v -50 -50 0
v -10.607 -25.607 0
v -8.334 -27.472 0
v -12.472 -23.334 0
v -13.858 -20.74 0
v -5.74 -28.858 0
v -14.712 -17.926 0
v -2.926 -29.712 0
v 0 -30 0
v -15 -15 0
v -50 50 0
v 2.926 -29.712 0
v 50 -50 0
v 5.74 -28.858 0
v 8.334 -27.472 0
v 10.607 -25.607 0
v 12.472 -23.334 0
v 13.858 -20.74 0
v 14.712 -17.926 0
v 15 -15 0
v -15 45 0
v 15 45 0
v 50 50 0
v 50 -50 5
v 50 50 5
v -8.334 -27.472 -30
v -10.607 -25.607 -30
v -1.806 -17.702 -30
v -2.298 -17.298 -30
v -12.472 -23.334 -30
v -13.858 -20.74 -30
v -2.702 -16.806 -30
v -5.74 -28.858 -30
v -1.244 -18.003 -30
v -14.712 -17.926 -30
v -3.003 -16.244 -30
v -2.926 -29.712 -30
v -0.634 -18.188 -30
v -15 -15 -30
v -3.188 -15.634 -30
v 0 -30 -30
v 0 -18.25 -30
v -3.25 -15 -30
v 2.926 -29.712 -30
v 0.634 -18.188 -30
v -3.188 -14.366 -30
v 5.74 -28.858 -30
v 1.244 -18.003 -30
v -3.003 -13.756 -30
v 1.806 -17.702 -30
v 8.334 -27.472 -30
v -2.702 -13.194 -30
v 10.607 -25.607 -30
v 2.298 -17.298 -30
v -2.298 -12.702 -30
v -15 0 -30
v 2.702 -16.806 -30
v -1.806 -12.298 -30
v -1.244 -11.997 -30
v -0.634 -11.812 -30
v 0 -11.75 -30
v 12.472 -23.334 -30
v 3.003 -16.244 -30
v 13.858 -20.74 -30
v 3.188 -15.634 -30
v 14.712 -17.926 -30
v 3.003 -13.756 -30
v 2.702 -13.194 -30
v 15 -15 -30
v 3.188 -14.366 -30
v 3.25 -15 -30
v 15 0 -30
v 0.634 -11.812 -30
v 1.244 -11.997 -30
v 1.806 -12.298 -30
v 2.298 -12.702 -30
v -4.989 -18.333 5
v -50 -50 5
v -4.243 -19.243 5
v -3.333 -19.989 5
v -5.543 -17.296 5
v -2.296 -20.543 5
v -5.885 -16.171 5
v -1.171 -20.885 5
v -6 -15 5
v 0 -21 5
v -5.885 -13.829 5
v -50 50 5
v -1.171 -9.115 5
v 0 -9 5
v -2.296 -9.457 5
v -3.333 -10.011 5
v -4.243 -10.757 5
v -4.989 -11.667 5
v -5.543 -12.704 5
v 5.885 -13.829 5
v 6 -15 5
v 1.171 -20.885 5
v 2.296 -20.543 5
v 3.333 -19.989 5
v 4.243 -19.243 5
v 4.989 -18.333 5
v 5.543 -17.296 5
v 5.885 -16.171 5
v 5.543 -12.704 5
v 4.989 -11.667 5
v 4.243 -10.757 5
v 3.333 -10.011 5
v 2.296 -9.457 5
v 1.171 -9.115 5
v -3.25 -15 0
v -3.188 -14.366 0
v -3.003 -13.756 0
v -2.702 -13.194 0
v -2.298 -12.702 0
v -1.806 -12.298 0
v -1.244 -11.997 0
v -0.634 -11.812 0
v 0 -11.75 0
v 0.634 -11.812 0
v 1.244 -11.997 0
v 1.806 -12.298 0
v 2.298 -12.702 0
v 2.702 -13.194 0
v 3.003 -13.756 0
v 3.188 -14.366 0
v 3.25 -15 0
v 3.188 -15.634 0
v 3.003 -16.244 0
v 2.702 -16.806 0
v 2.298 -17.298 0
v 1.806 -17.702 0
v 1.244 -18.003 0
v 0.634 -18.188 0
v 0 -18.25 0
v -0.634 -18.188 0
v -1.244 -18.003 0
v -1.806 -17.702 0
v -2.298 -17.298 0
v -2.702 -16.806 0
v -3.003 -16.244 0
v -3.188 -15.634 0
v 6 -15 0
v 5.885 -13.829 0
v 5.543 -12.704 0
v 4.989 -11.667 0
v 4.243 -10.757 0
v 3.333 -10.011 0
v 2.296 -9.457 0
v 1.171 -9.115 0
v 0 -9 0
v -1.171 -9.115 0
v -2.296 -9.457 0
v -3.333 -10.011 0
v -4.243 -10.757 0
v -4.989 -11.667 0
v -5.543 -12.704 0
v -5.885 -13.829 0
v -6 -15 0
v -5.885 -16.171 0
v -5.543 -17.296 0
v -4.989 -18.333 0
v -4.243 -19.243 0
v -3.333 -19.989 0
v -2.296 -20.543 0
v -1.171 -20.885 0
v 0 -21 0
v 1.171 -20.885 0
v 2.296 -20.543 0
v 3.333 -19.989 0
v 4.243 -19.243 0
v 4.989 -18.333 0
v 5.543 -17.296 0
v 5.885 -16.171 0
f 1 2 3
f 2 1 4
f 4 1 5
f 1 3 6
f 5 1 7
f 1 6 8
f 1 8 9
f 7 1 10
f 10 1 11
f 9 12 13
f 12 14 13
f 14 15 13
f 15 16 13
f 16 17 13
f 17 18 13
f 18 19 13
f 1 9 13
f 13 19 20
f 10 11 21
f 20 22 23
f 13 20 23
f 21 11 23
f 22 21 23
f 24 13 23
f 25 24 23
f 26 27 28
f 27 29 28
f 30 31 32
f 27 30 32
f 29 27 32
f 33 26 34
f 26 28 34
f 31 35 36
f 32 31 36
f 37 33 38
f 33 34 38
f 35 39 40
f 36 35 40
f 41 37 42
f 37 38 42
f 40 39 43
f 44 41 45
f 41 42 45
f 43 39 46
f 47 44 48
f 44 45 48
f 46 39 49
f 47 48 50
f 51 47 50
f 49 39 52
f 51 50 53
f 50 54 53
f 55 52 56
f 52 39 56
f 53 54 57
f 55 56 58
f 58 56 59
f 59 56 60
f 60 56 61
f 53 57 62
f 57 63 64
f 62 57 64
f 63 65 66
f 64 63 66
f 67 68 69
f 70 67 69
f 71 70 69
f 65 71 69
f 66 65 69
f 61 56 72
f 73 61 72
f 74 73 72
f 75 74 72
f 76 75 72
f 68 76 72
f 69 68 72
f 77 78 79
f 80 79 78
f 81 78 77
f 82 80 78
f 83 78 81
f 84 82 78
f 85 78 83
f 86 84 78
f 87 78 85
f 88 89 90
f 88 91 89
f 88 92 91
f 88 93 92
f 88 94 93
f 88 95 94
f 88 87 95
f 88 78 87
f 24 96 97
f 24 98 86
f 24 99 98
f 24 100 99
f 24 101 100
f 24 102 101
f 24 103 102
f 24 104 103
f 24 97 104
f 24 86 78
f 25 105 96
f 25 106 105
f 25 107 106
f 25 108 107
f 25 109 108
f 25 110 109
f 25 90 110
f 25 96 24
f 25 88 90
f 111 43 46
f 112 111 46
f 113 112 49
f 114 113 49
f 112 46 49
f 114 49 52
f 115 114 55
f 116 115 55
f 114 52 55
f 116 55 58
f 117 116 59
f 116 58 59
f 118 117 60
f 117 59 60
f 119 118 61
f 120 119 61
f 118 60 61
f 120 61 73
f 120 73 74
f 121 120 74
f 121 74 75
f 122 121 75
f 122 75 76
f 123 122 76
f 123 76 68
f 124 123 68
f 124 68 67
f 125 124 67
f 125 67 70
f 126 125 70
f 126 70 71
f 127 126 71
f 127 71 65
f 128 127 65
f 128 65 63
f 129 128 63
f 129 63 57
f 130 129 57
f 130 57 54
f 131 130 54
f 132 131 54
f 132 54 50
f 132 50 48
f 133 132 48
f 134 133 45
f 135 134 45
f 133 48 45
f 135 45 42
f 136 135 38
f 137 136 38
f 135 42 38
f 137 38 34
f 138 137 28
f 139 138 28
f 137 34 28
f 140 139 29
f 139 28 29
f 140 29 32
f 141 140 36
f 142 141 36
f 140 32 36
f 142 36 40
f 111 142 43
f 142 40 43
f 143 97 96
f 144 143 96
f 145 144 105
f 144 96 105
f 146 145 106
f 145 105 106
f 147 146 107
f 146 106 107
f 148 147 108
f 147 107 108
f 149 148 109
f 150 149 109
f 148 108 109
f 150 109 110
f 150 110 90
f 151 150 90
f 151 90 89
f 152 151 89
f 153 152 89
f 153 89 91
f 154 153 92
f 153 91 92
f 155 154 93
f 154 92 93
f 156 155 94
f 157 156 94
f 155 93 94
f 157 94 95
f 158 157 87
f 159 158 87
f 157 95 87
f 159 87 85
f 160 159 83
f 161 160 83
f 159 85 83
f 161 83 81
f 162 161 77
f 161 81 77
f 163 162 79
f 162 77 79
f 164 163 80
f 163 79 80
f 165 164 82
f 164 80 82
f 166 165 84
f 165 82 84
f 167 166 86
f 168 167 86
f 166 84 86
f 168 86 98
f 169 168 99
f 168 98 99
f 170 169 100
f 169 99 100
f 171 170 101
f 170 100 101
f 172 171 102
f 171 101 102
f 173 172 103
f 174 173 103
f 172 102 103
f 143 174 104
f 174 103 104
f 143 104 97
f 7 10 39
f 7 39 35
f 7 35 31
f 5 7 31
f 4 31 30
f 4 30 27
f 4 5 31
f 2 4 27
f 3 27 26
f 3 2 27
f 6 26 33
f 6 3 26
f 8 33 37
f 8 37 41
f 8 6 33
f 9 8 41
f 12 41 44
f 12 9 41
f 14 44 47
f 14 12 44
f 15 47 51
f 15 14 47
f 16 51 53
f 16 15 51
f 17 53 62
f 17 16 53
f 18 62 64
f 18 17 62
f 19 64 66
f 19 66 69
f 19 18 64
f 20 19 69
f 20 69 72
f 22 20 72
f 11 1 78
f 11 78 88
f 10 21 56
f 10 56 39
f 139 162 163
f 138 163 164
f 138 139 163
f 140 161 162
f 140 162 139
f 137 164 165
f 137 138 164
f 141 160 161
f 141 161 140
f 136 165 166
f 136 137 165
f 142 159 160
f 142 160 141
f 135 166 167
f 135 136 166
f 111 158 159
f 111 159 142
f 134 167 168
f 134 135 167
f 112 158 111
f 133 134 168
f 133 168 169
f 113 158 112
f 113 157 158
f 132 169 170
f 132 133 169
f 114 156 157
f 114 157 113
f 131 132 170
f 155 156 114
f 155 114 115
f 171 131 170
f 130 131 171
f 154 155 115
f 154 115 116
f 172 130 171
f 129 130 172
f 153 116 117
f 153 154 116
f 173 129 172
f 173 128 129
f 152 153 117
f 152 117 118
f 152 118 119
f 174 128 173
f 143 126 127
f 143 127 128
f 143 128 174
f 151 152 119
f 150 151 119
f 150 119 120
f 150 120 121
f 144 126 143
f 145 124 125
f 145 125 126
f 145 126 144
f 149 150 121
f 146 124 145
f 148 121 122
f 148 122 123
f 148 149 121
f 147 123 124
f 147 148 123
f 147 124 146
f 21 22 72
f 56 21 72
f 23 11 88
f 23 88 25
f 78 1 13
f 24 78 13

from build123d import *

# Parameters (mm, degrees)
ESQUISSE1_W             = 100
ESQUISSE1_H             = 100
BOSS_EXTRU_1_DEPTH      = 5
BOSS_EXTRU_2_DEPTH      = 30
ENL_V_MAT_EXTRU_1_DEPTH = 30
ESQUISSE6_R             = 3.25
ENL_V_MAT_EXTRU_2_DEPTH = 35
ESQUISSE7_R             = 6
ENL_V_MAT_EXTRU_3_DEPTH = 5


with BuildPart() as part:
    # Esquisse1 → Boss.-Extru.1 (new body)
    with BuildSketch(Plane.XY):
        Rectangle(ESQUISSE1_W, ESQUISSE1_H)
    extrude(amount=BOSS_EXTRU_1_DEPTH)

    # Esquisse4 → Boss.-Extru.2 (add)
    with BuildSketch(Plane(origin=(0, 0, 0), x_dir=(-1, 0, 0), z_dir=(0, 0, -1))):
        with BuildLine():
            Line((-15, 45), (15, 45))
            Line((15, 45), (15, -15))
            ThreePointArc((15, -15), (0, -30), (-15, -15))
            Line((-15, -15), (-15, 45))
        make_face()
    extrude(amount=BOSS_EXTRU_2_DEPTH)

    # Esquisse5 → Enlèv. mat.-Extru.1 (cut)
    with BuildSketch(Plane(origin=(15, 0, 0), x_dir=(0, 0, -1), z_dir=(1, 0, 0))):
        Polygon((0, 45), (30, 0), (30, 45), align=None)
    extrude(amount=-ENL_V_MAT_EXTRU_1_DEPTH, mode=Mode.SUBTRACT)

    # Esquisse6 → Enlèv. mat.-Extru.2 (cut)
    with BuildSketch(Plane(origin=(0, 0, -30), x_dir=(-1, 0, 0), z_dir=(0, 0, -1))):
        with Locations((0, -15)):
            Circle(ESQUISSE6_R)
    extrude(amount=-ENL_V_MAT_EXTRU_2_DEPTH, mode=Mode.SUBTRACT)

    # Esquisse7 → Enlèv. mat.-Extru.3 (cut)
    with BuildSketch(Plane.XY.offset(5)):
        with Locations((0, -15)):
            Circle(ESQUISSE7_R)
    extrude(amount=-ENL_V_MAT_EXTRU_3_DEPTH, mode=Mode.SUBTRACT)


solid = part.part
